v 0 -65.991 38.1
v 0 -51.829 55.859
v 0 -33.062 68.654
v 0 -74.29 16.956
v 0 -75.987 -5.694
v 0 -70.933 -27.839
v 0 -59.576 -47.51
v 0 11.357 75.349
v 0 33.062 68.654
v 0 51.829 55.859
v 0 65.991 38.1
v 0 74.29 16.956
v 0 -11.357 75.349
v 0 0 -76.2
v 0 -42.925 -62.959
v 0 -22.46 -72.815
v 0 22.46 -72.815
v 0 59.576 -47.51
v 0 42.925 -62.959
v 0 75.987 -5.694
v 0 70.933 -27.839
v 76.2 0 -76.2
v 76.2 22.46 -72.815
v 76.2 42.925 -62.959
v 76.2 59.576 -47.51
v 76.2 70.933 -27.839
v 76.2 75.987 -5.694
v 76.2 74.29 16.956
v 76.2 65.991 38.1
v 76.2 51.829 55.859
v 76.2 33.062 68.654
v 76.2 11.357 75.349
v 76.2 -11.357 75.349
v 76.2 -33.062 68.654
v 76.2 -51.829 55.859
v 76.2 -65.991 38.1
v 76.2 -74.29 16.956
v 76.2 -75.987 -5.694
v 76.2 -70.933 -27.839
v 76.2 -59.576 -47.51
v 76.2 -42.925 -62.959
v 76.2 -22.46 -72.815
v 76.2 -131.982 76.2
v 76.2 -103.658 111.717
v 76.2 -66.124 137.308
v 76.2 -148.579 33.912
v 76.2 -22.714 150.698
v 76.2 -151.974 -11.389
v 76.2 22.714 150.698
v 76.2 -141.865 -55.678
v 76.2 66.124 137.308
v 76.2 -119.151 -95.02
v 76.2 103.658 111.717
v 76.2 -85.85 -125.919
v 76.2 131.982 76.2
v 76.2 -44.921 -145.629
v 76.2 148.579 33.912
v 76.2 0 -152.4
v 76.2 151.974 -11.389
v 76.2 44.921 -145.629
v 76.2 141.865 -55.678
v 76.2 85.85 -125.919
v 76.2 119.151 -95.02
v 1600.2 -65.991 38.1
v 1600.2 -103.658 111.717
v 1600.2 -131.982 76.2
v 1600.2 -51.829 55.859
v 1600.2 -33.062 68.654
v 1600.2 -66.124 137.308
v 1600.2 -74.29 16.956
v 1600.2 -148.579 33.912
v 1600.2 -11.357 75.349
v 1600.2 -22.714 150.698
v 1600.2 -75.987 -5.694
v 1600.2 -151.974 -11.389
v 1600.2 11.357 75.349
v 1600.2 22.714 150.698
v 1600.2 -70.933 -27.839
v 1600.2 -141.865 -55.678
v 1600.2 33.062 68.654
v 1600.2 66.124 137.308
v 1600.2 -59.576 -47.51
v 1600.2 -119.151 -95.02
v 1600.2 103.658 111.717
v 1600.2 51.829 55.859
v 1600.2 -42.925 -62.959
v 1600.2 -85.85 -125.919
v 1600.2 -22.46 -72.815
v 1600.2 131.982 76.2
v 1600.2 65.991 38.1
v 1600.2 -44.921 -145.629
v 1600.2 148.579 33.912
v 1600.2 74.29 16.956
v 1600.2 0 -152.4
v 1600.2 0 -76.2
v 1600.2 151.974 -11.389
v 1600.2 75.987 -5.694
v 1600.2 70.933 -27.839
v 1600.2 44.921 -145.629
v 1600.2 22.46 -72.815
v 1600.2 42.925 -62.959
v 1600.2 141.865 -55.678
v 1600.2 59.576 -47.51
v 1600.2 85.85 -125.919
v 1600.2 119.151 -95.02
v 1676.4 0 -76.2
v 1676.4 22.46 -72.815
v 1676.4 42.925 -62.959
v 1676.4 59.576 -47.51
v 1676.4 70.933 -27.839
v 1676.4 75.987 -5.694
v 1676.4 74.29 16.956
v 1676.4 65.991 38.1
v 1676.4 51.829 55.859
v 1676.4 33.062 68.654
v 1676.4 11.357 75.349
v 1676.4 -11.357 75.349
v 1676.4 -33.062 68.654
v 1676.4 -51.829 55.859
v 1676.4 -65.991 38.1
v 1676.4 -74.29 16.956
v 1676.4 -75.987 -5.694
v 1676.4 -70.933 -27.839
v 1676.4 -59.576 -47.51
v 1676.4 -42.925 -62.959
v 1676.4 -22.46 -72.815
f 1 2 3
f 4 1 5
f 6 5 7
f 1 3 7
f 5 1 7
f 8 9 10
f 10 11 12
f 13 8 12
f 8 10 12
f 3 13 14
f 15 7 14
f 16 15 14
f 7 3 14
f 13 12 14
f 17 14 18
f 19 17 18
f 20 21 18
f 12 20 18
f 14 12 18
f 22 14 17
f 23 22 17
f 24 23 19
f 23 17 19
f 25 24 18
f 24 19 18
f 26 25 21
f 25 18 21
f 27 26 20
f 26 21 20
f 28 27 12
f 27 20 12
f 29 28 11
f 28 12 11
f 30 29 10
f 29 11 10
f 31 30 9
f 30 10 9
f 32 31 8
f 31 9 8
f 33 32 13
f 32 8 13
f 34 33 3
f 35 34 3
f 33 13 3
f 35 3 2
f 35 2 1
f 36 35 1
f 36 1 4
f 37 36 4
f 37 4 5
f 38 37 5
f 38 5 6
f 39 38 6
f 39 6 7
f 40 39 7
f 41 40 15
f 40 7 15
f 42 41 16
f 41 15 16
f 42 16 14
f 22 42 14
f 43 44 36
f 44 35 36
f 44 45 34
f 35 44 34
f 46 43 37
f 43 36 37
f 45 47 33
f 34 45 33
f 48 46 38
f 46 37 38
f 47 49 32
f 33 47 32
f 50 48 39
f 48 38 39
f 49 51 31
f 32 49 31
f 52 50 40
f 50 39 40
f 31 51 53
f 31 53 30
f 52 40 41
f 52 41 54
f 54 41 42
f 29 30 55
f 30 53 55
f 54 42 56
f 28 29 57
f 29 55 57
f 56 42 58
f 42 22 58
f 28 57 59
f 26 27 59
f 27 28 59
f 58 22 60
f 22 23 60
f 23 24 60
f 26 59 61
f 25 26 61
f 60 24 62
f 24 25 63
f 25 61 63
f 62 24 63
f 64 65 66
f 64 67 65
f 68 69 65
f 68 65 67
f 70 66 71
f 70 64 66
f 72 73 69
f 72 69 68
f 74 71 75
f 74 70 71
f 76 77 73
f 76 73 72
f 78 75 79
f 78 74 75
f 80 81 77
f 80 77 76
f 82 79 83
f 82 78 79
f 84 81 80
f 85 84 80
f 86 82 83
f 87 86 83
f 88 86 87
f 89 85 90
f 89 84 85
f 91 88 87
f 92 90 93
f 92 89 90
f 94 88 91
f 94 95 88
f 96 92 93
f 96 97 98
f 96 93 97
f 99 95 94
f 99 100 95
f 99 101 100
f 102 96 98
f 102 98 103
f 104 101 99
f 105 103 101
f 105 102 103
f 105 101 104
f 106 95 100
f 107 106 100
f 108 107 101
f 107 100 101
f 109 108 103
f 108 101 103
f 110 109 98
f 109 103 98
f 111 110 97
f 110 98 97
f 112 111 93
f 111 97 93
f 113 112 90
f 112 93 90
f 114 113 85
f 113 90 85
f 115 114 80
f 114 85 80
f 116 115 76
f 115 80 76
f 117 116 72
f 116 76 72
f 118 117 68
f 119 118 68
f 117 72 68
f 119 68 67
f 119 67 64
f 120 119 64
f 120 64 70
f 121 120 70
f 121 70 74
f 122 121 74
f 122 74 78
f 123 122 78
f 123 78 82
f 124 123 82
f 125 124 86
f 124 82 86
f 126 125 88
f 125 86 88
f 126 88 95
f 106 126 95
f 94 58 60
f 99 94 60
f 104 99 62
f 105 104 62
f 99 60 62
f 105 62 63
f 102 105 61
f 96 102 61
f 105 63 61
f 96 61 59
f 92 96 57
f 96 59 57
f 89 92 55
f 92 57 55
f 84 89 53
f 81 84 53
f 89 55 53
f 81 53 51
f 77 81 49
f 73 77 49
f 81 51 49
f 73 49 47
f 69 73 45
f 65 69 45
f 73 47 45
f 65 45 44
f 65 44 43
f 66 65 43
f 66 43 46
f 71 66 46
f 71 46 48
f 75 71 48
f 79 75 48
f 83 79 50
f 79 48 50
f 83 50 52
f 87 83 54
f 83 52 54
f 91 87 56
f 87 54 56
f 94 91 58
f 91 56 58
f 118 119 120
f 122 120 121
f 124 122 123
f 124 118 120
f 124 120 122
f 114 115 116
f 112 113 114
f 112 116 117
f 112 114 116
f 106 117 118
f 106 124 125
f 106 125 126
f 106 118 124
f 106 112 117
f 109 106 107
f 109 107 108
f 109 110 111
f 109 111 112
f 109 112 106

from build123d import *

# Parameters (mm, degrees)
SKETCH1_R           = 76.2
BOSS_EXTRUDE1_DEPTH = 76.2
SKETCH2_R           = 152.4
BOSS_EXTRUDE2_DEPTH = 1524
SKETCH3_R           = 76.2
BOSS_EXTRUDE3_DEPTH = 76.2


with BuildPart() as part:
    # Sketch1 → Boss-Extrude1 (new body)
    with BuildSketch(Plane(origin=(0, 0, 0), x_dir=(0, 0, -1), z_dir=(1, 0, 0))):
        Circle(SKETCH1_R)
    extrude(amount=BOSS_EXTRUDE1_DEPTH)

    # Sketch2 → Boss-Extrude2 (add)
    with BuildSketch(Plane(origin=(76.2, 0, 0), x_dir=(0, 0, -1), z_dir=(1, 0, 0))):
        Circle(SKETCH2_R)
    extrude(amount=BOSS_EXTRUDE2_DEPTH)

    # Sketch3 → Boss-Extrude3 (add)
    with BuildSketch(Plane(origin=(1600.2, 0, 0), x_dir=(0, 0, -1), z_dir=(1, 0, 0))):
        Circle(SKETCH3_R)
    extrude(amount=BOSS_EXTRUDE3_DEPTH)


solid = part.part
